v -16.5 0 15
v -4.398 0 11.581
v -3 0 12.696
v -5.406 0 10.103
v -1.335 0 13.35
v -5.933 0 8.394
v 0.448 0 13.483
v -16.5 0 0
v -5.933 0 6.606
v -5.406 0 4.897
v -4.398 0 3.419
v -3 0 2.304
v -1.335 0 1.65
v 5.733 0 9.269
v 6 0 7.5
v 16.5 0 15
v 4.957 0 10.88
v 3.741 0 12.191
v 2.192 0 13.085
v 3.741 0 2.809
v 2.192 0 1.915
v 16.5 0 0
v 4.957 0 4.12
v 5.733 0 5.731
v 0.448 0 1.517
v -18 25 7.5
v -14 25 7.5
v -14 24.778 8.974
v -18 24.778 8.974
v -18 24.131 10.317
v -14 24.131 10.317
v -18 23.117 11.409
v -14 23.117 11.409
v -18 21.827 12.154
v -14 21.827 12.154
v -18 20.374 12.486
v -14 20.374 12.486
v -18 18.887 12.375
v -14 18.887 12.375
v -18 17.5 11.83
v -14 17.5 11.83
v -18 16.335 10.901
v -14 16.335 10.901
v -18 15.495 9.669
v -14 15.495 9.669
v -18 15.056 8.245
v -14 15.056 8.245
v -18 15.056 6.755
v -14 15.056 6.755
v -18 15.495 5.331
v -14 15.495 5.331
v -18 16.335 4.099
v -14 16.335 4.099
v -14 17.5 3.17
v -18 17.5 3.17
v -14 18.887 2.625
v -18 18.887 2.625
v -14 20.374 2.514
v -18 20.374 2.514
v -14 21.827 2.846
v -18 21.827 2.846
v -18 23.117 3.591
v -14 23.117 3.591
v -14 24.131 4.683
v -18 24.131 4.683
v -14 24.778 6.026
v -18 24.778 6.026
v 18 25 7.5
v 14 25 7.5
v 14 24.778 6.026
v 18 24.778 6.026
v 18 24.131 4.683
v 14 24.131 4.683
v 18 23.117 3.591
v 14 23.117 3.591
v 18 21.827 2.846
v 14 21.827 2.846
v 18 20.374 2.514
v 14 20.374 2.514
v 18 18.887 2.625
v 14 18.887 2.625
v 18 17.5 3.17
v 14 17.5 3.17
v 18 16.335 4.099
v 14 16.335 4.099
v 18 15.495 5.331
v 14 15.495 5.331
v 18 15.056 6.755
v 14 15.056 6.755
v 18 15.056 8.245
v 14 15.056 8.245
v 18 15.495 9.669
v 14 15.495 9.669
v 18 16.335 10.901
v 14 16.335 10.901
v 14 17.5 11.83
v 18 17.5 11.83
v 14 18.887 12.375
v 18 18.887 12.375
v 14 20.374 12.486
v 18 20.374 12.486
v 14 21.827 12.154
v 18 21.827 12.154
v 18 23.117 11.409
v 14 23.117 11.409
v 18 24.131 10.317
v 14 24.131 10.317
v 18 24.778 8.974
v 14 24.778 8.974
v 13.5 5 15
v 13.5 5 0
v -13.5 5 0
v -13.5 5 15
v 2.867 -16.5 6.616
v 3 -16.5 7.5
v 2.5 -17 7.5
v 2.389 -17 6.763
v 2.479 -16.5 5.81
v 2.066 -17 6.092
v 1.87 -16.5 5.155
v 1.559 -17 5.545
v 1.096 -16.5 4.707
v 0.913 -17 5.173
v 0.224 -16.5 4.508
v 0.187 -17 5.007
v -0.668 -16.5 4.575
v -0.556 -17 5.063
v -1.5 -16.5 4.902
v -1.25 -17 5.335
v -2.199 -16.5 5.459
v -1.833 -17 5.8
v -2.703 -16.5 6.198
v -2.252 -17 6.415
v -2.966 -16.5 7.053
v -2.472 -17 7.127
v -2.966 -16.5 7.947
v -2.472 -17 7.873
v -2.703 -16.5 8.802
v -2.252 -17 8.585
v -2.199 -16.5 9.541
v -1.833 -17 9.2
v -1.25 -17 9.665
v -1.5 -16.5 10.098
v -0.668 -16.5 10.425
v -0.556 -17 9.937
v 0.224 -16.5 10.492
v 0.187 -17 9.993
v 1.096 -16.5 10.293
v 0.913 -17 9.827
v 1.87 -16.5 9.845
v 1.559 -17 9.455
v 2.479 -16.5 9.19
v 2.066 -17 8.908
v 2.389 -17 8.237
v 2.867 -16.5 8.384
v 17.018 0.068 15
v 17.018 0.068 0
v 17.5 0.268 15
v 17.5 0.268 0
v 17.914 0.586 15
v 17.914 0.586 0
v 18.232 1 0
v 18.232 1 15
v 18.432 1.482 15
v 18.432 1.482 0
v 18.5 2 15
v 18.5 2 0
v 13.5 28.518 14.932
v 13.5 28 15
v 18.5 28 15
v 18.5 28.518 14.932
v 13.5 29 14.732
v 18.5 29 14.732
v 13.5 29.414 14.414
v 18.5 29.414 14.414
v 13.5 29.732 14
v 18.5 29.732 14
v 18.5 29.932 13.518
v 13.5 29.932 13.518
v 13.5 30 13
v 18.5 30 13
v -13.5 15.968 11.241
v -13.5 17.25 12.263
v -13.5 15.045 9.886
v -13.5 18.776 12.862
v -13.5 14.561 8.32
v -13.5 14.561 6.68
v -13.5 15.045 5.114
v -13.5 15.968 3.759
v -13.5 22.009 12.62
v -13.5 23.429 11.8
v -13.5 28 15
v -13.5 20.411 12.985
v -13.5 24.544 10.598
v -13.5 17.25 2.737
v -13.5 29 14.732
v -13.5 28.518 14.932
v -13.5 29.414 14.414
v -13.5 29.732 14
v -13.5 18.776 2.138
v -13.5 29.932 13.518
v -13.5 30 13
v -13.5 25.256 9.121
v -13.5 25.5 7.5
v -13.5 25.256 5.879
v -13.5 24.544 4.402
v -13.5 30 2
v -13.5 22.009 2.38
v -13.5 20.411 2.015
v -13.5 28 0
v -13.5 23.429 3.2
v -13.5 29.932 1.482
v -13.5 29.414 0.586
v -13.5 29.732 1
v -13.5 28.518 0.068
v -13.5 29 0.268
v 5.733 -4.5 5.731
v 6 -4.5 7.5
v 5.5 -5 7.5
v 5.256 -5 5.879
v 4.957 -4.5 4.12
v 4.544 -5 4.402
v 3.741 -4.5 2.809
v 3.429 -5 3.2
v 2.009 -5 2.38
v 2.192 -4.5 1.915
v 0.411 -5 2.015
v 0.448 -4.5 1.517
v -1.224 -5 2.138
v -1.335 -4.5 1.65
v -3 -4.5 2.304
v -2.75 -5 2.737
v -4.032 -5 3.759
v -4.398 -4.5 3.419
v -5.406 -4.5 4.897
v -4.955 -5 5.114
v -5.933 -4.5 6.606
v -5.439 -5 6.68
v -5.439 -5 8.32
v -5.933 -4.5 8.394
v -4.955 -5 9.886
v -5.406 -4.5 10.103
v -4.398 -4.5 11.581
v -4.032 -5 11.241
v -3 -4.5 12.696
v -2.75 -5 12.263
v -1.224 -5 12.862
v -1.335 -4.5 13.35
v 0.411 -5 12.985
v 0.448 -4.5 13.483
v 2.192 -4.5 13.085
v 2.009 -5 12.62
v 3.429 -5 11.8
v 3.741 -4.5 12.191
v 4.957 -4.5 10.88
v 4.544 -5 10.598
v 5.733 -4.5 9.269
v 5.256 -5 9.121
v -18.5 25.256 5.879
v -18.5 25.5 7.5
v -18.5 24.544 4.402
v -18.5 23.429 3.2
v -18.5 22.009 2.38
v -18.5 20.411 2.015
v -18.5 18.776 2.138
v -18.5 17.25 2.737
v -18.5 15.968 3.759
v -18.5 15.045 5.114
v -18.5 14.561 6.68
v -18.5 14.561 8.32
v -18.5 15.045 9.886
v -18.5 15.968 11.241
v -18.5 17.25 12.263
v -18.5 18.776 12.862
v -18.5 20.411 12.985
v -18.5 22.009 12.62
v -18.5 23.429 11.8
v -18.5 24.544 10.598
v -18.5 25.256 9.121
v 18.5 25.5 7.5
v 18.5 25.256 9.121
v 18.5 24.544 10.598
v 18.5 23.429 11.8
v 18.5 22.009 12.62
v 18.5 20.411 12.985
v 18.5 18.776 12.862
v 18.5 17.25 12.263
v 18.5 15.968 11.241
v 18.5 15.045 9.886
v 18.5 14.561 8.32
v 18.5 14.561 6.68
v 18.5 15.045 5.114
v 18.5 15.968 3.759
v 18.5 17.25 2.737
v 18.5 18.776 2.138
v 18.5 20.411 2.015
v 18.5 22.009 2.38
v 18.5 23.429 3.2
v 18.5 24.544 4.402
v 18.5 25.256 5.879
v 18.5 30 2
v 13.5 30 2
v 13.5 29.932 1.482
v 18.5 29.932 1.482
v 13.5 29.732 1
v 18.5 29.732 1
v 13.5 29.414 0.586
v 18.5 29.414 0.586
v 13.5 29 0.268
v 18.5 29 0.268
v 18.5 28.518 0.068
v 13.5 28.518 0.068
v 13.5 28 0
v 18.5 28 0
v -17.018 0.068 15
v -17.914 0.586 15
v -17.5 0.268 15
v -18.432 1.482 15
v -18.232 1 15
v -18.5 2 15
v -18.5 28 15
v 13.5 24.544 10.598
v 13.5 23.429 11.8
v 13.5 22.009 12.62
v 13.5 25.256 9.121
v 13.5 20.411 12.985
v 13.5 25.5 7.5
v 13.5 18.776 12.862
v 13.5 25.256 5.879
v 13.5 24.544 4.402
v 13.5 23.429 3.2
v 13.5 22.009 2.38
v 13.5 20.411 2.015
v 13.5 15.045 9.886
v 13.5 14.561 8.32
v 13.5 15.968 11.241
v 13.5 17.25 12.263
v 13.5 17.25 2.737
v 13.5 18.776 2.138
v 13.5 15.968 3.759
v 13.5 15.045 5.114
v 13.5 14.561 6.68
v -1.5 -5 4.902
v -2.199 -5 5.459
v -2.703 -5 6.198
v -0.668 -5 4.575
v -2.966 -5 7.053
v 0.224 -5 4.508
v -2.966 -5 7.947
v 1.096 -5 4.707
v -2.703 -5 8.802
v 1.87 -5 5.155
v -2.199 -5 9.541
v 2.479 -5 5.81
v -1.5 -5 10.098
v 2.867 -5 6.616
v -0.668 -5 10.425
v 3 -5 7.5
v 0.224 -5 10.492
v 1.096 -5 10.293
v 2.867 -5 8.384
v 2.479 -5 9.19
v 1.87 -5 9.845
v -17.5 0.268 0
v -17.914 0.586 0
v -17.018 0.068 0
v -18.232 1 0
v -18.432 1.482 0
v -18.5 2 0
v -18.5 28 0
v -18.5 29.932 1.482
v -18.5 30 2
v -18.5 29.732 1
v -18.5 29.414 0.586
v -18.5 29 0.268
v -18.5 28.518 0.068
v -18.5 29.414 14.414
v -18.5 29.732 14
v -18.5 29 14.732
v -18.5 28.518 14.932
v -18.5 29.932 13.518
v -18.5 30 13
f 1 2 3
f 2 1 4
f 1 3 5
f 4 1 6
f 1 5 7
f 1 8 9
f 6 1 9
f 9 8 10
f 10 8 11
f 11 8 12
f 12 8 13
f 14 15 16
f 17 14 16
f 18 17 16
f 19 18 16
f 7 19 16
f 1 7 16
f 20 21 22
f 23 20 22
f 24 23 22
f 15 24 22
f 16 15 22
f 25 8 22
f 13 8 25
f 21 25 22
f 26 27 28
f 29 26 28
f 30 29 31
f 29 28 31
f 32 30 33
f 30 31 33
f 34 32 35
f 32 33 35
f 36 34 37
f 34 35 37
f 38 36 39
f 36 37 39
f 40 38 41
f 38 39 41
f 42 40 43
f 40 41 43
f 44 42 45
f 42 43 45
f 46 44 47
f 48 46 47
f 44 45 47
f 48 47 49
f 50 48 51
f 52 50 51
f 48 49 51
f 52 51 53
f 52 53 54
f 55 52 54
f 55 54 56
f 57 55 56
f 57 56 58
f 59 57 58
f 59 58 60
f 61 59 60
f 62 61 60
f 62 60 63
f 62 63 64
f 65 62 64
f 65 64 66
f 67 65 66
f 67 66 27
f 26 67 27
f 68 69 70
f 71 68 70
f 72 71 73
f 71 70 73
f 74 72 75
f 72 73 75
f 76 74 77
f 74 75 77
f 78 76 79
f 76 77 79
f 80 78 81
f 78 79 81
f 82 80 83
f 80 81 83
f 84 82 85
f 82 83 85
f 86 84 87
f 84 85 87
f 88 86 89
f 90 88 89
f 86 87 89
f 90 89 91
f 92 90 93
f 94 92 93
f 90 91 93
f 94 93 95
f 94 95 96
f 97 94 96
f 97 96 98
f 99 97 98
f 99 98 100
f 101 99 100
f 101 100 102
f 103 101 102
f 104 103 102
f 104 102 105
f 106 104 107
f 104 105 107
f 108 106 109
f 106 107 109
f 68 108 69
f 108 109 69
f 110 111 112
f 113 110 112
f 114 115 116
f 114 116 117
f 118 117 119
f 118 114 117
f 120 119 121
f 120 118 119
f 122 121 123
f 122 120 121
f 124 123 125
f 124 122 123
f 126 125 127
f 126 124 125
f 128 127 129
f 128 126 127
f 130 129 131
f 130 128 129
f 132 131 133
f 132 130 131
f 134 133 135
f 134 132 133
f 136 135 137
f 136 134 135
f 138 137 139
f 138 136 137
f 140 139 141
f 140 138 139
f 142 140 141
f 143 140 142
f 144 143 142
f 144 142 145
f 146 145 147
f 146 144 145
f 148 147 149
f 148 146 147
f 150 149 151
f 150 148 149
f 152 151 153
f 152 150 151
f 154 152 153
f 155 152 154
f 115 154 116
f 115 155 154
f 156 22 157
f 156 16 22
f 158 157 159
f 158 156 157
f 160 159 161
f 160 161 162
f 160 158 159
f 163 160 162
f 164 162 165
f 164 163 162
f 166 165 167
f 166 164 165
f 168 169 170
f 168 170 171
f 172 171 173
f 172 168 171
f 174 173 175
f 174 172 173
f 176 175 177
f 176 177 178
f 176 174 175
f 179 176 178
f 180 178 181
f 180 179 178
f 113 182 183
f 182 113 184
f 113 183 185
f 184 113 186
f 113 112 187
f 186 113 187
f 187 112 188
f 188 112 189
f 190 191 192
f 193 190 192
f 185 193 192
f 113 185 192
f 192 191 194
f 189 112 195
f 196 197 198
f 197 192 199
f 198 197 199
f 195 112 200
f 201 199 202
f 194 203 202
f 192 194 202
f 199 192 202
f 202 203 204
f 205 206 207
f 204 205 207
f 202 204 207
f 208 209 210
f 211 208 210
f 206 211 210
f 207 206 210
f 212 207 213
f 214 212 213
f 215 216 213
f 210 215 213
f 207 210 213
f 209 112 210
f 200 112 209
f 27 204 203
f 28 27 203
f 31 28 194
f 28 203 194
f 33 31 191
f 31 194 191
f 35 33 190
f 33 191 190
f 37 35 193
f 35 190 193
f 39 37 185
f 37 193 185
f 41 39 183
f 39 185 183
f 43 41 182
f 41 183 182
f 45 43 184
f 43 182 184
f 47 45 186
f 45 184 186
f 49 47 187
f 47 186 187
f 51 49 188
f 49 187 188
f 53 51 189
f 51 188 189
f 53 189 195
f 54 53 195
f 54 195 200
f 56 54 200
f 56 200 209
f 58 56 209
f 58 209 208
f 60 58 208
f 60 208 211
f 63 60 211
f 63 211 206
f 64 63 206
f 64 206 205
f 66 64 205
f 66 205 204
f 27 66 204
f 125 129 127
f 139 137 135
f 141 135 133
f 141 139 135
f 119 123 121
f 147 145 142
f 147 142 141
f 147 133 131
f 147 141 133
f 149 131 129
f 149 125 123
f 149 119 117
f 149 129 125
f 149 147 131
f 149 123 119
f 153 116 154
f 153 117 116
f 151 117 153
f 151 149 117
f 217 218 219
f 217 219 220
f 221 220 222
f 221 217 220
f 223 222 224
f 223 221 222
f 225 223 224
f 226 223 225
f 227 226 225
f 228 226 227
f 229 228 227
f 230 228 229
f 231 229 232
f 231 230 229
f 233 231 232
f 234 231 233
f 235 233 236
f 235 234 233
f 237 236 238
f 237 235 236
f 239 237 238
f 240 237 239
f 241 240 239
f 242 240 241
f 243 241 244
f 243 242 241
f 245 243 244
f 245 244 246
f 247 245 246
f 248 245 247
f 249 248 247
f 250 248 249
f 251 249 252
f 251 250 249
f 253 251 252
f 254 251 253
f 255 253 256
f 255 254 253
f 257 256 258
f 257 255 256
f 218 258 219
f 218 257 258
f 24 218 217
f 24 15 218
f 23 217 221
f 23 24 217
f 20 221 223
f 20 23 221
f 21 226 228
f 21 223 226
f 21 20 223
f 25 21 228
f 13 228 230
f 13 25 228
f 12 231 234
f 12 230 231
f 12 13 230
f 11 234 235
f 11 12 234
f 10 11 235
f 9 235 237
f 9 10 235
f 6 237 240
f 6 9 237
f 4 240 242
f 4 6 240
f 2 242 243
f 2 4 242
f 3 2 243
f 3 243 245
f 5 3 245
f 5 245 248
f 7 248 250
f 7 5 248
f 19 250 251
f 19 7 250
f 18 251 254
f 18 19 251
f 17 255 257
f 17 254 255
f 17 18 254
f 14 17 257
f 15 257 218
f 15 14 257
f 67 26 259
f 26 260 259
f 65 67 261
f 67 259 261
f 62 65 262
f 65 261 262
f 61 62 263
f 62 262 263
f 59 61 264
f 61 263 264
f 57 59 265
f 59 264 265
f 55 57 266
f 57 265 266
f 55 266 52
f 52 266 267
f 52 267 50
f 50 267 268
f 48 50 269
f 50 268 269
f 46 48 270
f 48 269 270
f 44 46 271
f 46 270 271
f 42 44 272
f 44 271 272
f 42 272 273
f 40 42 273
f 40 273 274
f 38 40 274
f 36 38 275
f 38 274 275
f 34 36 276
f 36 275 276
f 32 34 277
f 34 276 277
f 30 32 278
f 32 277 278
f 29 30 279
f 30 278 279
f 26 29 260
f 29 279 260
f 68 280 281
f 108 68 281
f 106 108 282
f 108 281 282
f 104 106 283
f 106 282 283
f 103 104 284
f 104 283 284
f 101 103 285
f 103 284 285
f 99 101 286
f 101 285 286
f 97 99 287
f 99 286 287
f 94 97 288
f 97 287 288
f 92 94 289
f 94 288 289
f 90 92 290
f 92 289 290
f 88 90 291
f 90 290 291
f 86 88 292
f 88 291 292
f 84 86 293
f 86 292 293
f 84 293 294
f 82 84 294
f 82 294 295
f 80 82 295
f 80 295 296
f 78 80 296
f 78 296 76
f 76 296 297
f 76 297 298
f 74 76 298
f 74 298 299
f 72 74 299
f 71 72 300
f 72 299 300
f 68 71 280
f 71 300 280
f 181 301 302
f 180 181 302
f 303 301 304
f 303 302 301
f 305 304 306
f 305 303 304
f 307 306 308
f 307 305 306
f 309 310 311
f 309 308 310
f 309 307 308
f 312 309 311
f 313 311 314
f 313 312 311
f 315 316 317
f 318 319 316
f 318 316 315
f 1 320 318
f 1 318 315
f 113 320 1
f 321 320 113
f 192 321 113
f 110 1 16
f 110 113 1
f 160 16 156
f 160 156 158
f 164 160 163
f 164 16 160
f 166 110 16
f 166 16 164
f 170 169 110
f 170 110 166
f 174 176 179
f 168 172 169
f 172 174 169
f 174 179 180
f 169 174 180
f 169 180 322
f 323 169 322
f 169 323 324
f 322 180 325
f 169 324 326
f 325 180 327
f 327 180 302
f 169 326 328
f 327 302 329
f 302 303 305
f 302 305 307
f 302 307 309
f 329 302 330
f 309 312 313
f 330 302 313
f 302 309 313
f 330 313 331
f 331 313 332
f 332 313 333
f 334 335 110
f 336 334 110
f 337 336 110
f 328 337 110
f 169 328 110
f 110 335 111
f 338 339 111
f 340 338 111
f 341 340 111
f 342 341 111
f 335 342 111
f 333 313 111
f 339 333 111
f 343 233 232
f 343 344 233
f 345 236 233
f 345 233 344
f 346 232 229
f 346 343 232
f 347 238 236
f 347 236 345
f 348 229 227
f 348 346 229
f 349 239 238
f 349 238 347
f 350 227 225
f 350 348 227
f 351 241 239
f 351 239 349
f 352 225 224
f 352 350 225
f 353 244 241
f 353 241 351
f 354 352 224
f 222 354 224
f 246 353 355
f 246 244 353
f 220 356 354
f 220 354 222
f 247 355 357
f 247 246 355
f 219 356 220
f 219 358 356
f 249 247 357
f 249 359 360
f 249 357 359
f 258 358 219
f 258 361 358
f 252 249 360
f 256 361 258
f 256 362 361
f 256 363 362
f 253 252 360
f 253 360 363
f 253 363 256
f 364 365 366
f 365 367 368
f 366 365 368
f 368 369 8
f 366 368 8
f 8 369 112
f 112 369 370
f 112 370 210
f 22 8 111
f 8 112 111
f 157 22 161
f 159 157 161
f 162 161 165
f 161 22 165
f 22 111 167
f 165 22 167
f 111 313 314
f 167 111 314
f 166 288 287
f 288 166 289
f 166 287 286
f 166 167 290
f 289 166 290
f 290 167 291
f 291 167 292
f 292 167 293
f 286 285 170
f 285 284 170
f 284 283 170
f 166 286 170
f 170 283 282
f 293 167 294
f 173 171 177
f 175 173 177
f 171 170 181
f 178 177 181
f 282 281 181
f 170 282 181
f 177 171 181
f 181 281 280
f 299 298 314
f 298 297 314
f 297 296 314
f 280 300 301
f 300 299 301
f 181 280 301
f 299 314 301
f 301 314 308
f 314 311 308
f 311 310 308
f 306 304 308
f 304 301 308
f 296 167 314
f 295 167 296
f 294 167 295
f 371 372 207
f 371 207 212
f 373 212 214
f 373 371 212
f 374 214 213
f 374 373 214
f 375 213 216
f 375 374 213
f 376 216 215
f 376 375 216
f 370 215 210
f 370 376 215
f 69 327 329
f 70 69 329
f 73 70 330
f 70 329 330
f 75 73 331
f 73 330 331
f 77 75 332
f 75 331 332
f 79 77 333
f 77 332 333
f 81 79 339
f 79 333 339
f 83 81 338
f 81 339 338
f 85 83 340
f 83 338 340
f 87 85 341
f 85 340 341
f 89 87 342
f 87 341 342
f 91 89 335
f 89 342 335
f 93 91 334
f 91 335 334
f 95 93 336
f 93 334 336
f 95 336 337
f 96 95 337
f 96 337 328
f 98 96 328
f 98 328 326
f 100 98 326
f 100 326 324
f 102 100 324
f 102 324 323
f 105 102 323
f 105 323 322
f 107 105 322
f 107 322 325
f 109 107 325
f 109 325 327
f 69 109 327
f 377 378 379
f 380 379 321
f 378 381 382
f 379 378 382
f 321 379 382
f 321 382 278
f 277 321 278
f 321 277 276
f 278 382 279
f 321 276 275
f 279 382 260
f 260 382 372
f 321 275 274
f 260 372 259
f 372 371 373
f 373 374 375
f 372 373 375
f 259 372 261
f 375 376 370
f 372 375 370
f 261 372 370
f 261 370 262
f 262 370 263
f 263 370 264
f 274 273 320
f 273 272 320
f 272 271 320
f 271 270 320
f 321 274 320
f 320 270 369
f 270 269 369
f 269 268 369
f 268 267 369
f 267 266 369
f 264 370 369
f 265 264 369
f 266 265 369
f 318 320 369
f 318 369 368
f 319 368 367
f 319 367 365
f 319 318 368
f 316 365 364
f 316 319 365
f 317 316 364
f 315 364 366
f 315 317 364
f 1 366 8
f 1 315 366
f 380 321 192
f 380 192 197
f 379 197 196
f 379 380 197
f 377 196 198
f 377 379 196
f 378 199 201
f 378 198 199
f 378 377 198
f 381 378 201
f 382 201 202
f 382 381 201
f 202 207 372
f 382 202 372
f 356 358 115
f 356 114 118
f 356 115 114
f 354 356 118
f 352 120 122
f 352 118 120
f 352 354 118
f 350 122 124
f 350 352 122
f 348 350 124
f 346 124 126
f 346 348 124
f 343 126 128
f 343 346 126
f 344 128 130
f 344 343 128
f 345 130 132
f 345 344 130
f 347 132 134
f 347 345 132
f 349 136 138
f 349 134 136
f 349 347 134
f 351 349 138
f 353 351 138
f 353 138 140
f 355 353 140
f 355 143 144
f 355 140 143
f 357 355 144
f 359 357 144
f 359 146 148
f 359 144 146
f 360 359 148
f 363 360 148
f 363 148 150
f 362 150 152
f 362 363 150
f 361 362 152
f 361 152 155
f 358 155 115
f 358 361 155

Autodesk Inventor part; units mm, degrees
ref_plane "YZ Plane" through (0, 0, 0) normal (1, 0, 0) x (0, 1, 0)
ref_plane "XZ Plane" through (0, 0, 0) normal (0, 1, 0) x (-1, 0, 0)
ref_plane "XY Plane" through (0, 0, 0) normal (0, 0, 1) x (1, 0, 0)
sketch "Schizzo1" plane through (0, 0, 0) normal (0, 0, 1) x (1, 0, 0)
  line L0 (-18.5, 30) -> (-18.5, 0)
  line L1 (-18.5, 0) -> (18.5, 0)
  line L2 (18.5, 0) -> (18.5, 30)
  line L3 (18.5, 30) -> (13.5, 30)
  line L4 (13.5, 30) -> (13.5, 5)
  line L5 (13.5, 5) -> (-13.5, 5)
  line L6 (-13.5, 5) -> (-13.5, 30)
  line L7 (-13.5, 30) -> (-18.5, 30)
  point P0 (0, 0)
  point P1 (0, 5)
  point P2 (0, 0)
  dimension "d0" = 37
  dimension "d1" = 27
  dimension "d2" = 5
  dimension "d3" = 30
extrude "Estrusione1" add sketch "Schizzo1" along normal blind 15
sketch "Schizzo2" plane through (0, 0, 0) normal (1, 0, 0) x (0, 1, 0)
  line L0 (5, 0) -> (30, 0) projected
  line L1 (30, 0) -> (30, 15) projected
  line L2 (5, 15) -> (30, 15) projected
  line L3 (5, 0) -> (5, 15) projected
  circle A0 centre (20, 7.5) radius 5
  point P0 (0, 0)
  point P1 (30, 7.5)
  point P2 (17.5, 0)
  dimension "d6" = 10
  dimension "d23" = 10
extrude "Estrusione2" cut sketch "Schizzo2" along normal through all both and the other way through all contours A0
fillet "Raccordo1" radius 2 6 edges at (-16, 30, 15) (-16, 30, 0) (16, 30, 15) (16, 30, 0) (18.5, 0, 7.5) (-18.5, 0, 7.5)
sketch "Schizzo3" plane through (-16.5, 0, 0) normal (0, -1, 0) x (1, 0, 0)
  line L0 (0, 0) -> (0, 15) projected
  line L1 (0, 0) -> (33, 0) projected
  line L2 (33, 15) -> (33, 0) projected
  line L3 (0, 15) -> (33, 15) projected
  circle A0 centre (16.5, 7.5) radius 6
  point P0 (16.5, 0)
  point P1 (33, 7.5)
  point P2 (16.5, 0)
  dimension "d13" = 12
extrude "Estrusione3" add sketch "Schizzo3" along normal blind 5 contours A0
sketch "Schizzo4" plane through (0, -5, 7.5) normal (0, -1, 0) x (1, 0, 0)
  circle A0 centre (0, 0) radius 3
  point P0 (0, -7.5)
  dimension "d16" = 6
extrude "Estrusione4" add sketch "Schizzo4" along normal blind 12
chamfer "Smusso1" distance 0.5 angle 45 6 edges at (-13.5, 15, 7.5) (13.5, 15, 7.5) (-18.5, 15, 7.5) (18.5, 15, 7.5) (-3, -17, 7.5) (-6, -5, 7.5)
thread "Filettatura2" size "M6x1" class "6g" standard "ANSI Metric M Profile" length 10
properties part number "Forcella movimento lama" material "Acciaio inossidabile"
